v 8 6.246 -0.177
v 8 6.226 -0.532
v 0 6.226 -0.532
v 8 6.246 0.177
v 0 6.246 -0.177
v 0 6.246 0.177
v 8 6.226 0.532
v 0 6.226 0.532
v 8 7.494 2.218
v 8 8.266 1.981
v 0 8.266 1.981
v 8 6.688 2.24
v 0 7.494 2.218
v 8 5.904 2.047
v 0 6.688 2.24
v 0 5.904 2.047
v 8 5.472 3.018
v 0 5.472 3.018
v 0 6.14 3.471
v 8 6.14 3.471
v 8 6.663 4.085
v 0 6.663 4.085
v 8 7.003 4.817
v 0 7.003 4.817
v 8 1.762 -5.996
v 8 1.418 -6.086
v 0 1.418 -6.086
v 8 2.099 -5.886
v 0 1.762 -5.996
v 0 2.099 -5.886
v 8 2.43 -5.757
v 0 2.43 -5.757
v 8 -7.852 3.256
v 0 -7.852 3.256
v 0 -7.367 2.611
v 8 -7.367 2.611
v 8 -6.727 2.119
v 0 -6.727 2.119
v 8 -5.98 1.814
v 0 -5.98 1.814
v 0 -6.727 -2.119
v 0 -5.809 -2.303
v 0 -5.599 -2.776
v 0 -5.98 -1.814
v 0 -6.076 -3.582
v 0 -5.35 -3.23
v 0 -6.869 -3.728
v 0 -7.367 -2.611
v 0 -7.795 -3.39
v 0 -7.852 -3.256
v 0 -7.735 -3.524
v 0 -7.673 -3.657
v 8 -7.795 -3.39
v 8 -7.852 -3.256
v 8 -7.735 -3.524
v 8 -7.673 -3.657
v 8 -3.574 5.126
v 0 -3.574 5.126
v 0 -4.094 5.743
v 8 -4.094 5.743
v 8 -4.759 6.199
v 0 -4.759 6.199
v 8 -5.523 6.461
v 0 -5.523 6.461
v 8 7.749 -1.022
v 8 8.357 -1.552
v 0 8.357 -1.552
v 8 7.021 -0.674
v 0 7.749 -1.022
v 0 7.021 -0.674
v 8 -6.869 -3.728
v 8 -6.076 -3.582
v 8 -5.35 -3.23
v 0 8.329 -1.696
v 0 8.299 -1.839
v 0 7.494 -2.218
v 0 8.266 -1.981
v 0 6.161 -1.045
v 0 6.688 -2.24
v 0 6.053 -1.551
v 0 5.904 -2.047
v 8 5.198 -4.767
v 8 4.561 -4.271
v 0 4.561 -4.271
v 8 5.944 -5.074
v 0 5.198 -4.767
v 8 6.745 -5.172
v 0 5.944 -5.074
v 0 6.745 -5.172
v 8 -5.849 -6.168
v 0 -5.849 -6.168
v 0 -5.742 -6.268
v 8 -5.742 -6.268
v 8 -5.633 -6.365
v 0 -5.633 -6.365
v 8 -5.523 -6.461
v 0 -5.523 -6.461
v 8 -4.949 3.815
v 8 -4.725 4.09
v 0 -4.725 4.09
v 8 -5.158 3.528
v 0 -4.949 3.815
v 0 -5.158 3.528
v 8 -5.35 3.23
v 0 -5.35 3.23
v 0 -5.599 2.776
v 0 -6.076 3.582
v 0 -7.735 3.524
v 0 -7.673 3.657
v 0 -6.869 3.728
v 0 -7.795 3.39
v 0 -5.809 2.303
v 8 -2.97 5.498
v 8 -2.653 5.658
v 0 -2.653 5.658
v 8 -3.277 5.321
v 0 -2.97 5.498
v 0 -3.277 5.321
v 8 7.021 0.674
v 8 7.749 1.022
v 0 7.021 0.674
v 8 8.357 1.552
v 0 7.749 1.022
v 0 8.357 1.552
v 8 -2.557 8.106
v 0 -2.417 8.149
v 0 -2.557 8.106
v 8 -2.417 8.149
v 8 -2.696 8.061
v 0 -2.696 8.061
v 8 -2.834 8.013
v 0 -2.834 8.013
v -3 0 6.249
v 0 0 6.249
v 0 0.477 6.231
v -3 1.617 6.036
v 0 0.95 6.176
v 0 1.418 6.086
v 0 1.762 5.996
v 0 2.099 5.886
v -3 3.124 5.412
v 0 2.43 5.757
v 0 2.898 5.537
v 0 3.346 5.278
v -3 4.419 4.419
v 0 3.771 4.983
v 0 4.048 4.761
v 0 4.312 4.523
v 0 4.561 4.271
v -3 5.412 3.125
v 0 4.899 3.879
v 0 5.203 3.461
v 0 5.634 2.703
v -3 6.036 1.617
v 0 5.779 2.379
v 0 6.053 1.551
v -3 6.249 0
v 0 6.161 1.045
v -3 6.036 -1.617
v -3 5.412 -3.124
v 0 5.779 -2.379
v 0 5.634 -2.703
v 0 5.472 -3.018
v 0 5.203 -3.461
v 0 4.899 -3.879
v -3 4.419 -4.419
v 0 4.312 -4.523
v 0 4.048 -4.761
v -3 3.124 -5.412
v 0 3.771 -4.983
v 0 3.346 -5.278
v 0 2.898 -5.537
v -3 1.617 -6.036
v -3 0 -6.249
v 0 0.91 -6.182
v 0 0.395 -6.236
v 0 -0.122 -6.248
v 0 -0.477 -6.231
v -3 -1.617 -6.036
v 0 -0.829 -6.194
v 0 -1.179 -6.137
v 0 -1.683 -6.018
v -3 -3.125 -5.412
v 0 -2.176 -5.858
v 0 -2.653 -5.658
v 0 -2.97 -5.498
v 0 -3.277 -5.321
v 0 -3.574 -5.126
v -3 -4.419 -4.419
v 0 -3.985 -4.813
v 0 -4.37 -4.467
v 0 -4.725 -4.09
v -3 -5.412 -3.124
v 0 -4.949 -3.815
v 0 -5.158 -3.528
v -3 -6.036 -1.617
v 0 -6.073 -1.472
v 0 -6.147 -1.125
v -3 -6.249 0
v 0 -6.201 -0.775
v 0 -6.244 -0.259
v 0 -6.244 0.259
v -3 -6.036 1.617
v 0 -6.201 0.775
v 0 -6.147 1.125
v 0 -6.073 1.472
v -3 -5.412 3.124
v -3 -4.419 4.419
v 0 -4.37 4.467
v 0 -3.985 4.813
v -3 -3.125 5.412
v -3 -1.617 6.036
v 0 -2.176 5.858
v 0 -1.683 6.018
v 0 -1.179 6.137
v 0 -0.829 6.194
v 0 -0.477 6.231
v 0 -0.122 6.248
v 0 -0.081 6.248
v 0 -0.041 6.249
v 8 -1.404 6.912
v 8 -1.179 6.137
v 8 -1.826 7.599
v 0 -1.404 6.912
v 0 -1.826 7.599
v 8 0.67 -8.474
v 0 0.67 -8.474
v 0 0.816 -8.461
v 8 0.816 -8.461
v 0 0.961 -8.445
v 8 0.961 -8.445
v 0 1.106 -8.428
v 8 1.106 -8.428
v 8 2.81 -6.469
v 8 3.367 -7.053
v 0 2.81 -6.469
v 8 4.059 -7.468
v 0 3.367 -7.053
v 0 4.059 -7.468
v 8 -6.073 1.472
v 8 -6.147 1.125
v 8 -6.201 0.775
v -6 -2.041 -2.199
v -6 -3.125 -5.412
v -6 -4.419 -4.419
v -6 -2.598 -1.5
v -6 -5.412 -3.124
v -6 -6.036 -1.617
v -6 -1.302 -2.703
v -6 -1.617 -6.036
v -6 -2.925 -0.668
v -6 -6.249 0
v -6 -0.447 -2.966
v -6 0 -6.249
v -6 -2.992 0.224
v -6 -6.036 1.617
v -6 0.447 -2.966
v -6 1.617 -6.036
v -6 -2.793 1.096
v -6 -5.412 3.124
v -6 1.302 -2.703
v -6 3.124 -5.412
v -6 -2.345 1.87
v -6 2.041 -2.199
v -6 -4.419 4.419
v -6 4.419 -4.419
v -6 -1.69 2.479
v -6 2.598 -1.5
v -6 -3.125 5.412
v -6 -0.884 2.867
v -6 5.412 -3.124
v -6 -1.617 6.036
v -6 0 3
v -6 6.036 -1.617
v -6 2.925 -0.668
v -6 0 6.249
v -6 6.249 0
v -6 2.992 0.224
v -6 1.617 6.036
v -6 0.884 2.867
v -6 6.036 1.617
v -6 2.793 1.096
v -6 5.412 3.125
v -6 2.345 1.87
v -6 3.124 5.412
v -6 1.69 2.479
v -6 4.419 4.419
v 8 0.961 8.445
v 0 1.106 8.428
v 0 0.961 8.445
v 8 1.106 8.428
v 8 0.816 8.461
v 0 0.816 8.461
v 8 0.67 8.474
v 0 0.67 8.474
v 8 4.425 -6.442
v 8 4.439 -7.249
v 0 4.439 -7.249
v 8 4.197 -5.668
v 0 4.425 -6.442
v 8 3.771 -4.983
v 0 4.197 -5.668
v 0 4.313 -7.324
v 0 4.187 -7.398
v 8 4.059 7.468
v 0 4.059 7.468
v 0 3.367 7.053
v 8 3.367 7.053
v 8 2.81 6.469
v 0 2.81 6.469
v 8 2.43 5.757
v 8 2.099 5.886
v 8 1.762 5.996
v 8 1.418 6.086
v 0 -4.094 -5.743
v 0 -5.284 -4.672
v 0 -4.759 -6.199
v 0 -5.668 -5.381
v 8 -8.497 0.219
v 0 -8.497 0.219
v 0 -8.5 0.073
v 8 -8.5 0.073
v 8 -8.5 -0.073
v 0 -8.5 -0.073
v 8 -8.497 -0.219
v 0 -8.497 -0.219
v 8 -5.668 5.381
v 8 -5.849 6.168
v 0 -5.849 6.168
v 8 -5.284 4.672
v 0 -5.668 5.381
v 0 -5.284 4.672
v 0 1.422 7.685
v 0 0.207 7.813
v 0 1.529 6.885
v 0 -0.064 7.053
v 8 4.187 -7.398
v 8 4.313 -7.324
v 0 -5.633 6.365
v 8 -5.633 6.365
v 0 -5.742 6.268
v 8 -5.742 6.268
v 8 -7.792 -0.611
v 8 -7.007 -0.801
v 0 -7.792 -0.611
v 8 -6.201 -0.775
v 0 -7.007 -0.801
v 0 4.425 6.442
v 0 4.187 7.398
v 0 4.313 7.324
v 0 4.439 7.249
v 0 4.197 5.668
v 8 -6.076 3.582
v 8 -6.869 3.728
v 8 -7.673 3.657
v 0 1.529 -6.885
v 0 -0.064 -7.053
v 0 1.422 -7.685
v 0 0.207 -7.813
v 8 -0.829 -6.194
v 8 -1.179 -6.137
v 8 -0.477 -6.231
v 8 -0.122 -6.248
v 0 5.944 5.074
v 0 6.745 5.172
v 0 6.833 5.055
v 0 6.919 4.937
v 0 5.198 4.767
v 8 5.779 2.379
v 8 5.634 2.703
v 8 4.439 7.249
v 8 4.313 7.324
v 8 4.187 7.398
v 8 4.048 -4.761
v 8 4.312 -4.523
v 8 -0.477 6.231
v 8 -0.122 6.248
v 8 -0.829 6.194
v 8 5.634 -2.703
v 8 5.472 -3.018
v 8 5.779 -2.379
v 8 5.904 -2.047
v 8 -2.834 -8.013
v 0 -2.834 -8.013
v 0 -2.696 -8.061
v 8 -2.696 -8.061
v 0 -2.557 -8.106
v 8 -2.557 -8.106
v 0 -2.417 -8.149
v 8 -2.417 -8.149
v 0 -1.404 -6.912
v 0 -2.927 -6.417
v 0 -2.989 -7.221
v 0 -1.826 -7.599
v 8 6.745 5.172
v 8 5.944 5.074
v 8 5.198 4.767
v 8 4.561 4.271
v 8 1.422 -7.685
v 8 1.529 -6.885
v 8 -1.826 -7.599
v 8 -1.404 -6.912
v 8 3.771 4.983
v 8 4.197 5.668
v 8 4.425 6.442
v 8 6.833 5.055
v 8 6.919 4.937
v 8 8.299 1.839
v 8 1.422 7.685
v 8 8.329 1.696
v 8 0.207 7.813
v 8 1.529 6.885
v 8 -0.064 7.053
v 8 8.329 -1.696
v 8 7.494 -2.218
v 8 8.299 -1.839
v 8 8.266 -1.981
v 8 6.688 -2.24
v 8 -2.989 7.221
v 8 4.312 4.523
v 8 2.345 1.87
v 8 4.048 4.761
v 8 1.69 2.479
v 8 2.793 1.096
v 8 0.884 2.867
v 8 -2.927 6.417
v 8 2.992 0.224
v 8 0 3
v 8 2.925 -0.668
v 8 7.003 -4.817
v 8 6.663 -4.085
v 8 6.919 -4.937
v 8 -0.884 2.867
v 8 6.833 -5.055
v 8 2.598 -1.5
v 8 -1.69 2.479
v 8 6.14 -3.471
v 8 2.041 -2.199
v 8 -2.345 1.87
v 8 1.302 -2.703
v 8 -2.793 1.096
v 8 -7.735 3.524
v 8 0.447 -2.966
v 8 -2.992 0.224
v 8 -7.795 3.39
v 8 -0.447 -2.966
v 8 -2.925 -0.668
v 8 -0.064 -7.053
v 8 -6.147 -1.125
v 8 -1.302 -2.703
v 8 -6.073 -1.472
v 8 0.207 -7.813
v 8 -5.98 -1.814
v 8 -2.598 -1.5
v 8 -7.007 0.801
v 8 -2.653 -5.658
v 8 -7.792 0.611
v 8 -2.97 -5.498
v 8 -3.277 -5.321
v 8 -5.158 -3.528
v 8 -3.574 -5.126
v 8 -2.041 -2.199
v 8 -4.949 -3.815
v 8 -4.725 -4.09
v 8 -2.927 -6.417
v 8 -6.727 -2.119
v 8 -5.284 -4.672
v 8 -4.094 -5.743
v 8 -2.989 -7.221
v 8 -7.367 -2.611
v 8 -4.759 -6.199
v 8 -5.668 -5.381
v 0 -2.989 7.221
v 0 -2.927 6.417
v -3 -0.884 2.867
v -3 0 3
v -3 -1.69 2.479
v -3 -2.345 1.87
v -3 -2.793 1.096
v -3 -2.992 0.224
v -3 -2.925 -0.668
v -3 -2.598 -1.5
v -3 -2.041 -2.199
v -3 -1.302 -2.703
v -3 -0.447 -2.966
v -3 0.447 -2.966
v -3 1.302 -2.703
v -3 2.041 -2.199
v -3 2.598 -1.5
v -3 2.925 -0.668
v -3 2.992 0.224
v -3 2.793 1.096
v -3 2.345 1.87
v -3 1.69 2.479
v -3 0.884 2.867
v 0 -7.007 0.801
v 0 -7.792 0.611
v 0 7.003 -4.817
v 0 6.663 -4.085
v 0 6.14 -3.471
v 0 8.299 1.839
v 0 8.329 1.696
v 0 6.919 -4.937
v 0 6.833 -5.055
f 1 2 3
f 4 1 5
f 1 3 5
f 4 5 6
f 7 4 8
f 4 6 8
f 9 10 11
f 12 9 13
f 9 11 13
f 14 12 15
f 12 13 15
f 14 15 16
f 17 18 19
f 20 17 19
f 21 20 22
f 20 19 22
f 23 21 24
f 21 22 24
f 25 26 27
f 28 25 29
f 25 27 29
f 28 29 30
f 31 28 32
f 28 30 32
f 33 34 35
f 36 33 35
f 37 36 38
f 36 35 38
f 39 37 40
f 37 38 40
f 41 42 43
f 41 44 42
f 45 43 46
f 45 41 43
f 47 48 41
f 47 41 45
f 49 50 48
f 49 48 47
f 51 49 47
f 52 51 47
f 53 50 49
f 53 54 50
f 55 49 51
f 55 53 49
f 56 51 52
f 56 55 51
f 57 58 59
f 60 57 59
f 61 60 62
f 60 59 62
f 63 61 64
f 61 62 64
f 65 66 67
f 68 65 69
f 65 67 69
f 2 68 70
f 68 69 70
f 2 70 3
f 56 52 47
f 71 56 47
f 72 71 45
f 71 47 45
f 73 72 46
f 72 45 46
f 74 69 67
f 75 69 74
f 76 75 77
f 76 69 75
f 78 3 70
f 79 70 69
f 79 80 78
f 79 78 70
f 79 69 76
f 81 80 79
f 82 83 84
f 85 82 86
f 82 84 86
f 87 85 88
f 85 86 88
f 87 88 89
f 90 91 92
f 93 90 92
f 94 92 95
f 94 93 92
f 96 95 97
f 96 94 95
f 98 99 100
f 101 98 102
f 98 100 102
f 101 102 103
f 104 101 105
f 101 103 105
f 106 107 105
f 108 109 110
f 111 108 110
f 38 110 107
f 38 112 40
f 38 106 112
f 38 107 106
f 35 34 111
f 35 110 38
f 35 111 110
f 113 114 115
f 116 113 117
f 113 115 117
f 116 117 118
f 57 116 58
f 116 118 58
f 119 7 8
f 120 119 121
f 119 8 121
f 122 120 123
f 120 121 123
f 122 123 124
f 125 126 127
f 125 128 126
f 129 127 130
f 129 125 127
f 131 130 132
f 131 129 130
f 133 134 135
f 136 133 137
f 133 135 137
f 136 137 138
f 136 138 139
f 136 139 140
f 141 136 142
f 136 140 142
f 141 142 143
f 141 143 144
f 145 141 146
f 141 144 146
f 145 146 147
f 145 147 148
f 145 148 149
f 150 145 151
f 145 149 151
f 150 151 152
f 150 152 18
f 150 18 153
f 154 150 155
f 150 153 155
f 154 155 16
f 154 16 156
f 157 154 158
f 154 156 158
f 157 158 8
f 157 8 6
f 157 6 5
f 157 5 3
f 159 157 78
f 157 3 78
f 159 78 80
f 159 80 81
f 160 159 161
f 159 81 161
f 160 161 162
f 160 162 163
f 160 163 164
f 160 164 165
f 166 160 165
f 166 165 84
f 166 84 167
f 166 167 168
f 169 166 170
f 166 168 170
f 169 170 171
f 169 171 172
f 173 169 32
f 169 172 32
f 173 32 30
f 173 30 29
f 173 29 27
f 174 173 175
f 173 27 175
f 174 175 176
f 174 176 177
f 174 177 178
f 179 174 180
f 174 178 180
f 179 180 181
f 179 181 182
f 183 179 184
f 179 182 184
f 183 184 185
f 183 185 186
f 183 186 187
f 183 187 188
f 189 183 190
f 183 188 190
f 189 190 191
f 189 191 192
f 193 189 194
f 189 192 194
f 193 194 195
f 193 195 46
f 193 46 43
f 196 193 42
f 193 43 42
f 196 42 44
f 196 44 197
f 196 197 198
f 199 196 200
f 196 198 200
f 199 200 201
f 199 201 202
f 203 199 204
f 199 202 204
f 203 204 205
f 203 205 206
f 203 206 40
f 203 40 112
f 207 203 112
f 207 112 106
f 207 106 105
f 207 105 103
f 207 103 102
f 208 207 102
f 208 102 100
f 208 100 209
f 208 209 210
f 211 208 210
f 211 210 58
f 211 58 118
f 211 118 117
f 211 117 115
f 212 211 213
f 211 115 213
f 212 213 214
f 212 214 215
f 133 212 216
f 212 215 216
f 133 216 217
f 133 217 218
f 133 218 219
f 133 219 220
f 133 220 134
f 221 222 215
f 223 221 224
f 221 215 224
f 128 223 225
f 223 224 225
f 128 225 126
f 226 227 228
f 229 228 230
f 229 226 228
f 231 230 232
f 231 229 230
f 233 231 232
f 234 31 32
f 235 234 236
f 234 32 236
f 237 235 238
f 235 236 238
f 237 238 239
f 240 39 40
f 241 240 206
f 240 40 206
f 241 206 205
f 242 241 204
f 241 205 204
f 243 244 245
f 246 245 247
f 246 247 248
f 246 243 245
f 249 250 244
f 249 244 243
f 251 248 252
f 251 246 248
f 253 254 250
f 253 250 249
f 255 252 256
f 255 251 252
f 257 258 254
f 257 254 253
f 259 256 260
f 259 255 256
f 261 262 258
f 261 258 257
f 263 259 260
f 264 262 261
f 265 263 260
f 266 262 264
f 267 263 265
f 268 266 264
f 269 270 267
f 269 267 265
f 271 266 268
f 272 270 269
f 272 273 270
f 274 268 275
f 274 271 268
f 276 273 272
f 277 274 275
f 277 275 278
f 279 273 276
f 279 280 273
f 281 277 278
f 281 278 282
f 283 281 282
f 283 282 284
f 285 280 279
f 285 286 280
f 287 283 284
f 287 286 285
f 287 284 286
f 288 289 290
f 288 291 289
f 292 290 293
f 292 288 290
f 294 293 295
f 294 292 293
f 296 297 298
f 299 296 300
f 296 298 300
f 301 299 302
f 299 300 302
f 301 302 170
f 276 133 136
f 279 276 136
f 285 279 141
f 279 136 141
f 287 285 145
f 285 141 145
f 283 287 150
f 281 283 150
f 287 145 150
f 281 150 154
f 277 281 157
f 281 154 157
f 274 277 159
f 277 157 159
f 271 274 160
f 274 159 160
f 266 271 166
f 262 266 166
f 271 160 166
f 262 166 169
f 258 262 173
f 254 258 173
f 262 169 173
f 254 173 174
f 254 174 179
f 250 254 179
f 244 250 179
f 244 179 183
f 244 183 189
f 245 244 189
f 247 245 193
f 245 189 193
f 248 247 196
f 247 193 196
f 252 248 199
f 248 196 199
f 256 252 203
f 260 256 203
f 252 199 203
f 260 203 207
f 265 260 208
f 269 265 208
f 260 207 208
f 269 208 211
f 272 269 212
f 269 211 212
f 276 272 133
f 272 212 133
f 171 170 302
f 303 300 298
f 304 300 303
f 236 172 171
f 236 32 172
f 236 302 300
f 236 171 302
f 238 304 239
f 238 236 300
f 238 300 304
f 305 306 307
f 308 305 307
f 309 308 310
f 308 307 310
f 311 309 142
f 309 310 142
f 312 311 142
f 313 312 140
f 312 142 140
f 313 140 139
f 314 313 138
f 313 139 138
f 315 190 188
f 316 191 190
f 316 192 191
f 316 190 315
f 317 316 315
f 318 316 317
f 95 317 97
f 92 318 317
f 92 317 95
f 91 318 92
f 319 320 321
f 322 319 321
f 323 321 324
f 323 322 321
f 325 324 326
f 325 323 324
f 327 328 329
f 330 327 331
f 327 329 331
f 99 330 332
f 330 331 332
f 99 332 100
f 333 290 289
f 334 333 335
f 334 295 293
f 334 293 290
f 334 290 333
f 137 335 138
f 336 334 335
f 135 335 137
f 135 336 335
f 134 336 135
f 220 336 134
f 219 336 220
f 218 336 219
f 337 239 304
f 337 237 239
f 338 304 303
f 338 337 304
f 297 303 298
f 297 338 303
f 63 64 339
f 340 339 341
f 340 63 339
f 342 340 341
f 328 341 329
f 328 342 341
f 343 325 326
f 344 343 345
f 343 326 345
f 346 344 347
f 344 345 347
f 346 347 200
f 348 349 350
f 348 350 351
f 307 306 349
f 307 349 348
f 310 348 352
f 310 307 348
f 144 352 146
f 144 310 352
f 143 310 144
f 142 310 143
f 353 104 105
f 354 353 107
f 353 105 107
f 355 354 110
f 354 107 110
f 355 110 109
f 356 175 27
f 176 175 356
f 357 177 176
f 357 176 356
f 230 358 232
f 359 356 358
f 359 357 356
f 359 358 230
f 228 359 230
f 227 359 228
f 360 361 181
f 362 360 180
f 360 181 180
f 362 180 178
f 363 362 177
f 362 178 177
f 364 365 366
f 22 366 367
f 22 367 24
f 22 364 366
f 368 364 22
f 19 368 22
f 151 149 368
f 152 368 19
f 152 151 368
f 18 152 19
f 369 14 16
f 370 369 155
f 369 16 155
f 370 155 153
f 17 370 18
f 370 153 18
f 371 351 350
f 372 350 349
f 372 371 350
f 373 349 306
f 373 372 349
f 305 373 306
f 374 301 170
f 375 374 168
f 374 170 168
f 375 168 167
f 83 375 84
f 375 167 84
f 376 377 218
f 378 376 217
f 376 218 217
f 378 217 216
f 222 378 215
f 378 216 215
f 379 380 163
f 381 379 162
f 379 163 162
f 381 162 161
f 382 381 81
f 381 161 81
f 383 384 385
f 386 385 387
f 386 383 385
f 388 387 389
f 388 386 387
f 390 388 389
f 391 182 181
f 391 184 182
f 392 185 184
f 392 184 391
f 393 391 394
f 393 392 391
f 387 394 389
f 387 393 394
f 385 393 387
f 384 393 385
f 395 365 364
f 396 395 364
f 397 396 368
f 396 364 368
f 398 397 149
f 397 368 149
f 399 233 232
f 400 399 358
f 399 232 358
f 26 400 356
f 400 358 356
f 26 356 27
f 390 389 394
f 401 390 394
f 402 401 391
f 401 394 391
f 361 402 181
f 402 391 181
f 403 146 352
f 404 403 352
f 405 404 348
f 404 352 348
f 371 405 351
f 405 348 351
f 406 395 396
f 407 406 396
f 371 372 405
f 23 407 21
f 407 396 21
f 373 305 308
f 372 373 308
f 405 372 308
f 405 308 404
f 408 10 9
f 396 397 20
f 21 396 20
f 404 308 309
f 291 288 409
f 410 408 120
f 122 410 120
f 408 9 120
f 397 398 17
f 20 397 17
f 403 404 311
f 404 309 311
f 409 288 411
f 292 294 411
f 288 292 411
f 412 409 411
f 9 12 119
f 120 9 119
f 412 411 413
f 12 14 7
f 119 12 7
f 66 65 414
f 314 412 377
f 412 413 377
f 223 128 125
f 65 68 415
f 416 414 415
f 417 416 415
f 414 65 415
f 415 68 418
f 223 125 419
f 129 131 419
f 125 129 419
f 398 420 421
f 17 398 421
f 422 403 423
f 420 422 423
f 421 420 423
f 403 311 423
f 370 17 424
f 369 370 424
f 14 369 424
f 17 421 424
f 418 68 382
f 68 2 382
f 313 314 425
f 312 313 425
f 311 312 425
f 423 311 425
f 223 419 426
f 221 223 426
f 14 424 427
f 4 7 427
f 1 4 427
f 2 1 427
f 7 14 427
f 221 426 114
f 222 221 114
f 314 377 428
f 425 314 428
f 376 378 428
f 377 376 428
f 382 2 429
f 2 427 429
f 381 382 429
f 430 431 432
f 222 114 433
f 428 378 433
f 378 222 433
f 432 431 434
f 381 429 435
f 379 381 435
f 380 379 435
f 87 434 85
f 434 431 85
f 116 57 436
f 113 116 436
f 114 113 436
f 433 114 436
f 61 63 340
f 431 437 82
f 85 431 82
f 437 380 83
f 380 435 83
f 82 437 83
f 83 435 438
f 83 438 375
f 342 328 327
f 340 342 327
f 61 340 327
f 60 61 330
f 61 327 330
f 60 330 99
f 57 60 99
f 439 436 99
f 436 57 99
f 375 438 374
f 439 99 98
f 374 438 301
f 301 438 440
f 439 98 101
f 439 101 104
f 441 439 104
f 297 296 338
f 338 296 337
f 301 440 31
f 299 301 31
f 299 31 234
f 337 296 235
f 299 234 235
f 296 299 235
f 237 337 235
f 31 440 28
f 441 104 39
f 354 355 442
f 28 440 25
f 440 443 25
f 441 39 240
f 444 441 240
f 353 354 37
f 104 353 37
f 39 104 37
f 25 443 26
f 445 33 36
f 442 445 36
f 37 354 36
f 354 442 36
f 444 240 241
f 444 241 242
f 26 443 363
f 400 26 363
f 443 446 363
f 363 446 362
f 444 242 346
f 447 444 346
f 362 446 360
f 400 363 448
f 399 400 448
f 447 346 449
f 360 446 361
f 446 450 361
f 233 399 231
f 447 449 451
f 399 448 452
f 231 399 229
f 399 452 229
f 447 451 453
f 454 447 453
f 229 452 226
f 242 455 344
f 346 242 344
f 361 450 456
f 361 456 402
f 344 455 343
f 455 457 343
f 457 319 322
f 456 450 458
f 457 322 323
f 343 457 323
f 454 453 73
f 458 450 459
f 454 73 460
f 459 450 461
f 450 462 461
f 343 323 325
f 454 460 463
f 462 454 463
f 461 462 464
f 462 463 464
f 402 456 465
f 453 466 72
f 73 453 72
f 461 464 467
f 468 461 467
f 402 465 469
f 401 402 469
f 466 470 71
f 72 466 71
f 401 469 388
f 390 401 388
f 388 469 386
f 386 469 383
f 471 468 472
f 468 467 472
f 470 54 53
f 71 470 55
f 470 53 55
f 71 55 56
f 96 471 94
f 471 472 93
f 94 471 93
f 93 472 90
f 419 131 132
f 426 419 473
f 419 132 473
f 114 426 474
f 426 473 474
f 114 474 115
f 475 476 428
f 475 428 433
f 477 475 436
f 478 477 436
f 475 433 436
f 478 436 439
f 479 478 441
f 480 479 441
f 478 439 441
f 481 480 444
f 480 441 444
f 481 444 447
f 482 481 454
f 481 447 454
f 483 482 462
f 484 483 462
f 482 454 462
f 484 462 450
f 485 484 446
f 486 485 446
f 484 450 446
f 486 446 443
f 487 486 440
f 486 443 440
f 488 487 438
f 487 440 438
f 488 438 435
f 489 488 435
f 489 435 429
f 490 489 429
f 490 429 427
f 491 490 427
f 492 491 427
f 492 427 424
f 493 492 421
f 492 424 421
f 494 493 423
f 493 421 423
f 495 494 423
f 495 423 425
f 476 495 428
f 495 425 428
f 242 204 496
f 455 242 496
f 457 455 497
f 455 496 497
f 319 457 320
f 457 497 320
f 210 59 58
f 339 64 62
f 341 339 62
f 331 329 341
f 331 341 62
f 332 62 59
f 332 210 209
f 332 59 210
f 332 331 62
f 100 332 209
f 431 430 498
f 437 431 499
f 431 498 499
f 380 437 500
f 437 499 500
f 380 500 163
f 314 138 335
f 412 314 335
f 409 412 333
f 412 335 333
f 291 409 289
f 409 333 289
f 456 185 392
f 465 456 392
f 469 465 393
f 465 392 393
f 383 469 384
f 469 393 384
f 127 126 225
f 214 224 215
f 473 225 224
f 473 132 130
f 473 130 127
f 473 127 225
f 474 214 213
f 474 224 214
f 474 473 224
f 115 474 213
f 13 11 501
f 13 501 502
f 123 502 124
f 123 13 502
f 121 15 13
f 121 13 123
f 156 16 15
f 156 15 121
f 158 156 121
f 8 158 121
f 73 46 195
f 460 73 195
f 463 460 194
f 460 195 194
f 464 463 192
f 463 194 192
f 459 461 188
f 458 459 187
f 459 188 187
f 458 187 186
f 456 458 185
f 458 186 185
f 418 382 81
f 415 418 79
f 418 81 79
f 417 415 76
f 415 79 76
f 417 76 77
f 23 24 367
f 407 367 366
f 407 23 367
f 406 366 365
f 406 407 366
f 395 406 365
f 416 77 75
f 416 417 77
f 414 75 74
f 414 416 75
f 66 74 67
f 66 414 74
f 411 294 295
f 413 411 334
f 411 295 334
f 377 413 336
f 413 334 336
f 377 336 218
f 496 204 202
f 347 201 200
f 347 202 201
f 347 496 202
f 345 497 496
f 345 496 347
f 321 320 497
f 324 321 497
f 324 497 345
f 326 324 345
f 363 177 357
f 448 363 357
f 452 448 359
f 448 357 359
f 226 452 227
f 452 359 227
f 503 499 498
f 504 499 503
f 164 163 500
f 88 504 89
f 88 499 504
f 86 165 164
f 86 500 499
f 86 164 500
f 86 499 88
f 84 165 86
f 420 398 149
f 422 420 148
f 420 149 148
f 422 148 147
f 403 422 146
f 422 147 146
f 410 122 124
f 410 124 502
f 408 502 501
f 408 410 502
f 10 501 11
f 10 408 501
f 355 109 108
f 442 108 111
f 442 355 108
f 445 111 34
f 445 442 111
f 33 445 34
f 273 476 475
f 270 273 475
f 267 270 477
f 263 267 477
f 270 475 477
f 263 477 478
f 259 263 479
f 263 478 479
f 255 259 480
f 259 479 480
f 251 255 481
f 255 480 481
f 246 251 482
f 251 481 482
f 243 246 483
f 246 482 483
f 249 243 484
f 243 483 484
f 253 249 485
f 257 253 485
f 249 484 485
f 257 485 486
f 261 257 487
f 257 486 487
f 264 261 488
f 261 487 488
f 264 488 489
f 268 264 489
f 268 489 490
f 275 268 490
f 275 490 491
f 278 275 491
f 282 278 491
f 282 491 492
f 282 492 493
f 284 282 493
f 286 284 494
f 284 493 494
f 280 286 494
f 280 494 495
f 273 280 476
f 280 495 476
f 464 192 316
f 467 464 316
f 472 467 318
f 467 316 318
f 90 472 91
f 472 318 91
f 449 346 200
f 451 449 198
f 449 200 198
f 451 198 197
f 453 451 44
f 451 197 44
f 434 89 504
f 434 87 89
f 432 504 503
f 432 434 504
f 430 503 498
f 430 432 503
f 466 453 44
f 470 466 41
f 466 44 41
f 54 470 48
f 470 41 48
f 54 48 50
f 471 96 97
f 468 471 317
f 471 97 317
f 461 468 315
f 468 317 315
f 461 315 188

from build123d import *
from build123d.topology import SkipClean

# Parameters (mm, degrees)
BASPROSKE_W      = 8
BASPROSKE_H      = 8.5
TOOTHCUT_DEPTH   = 15.439529078
TEETHCUTS_COUNT  = 15
TEETHCUTS_ANGLE  = 336
HUBNEAONESKE_R   = 6.249
HUBNEARONE_DEPTH = 3.0001524
BORSKE_R         = 3
BORE_DEPTH       = 11.0001524
MOVE_FACE1_BY    = 3


with BuildPart() as part:
    # BasProSke → Base-Revolve (revolve)
    with BuildSketch(Plane(origin=(0, 0, 0), x_dir=(1, 0, 0), z_dir=(0, 1, 0)), mode=Mode.PRIVATE) as base_revolve_sk:
        with Locations((4, 4.25)):
            Rectangle(BASPROSKE_W, BASPROSKE_H)
    revolve(base_revolve_sk.sketch.rotate(Axis((-10, 0, 0), (1, 0, 0)), 180), axis=Axis((-10, 0, 0), (1, 0, 0)))

    # TooCutSke → ToothCut (cut, through all)
    with BuildSketch(Plane(origin=(0, 0, 0), x_dir=(0, 0, -1), z_dir=(1, 0, 0))):
        with BuildLine():
            ThreePointArc((0.531576138, 6.226349477), (0, 6.249), (-0.531576138, 6.226349477))
            ThreePointArc((-0.531576138, 6.226349477), (-0.830301624, 7.411024729), (-1.576608494, 8.378350125))
            ThreePointArc((-1.576608494, 8.378350125), (0, 8.5254), (1.576608494, 8.378350125))
            ThreePointArc((1.576608494, 8.378350125), (0.830301624, 7.411024729), (0.531576138, 6.226349477))
        make_face()
    toothcut = extrude(amount=TOOTHCUT_DEPTH, mode=Mode.SUBTRACT)

    # TeethCuts: ToothCut ×15 about axis
    teethcuts_axis = Axis((-10, 0, 0), (1, 0, 0))
    for i in range(1, TEETHCUTS_COUNT):
        add(toothcut.rotate(teethcuts_axis, i * TEETHCUTS_ANGLE / (TEETHCUTS_COUNT - 1)), mode=Mode.SUBTRACT)

    # HubNeaOneSke → HubNearOne (add)
    with SkipClean():  # the faces are left unmerged after this step: merging them gives an invalid solid
        with BuildSketch(Plane.ZY):
            Circle(HUBNEAONESKE_R)
        extrude(amount=HUBNEARONE_DEPTH)

    # BorSke → Bore (cut, symmetric)
    with SkipClean():  # the faces are left unmerged after this step: merging them gives an invalid solid
        with BuildSketch(Plane(origin=(0, 0, 0), x_dir=(0, 0, -1), z_dir=(1, 0, 0))):
            with Locations(Location((0, 0, 0), (0, 0, 180))):
                Circle(BORSKE_R)
        extrude(amount=BORE_DEPTH, both=True, mode=Mode.SUBTRACT)

    # Move Face1: a face moved outward by 3.0
    extrude(part.faces().sort_by_distance((-3.0001524, -3.1245, 0))[0], amount=MOVE_FACE1_BY, dir=(-1, 0, 0))


solid = part.part
